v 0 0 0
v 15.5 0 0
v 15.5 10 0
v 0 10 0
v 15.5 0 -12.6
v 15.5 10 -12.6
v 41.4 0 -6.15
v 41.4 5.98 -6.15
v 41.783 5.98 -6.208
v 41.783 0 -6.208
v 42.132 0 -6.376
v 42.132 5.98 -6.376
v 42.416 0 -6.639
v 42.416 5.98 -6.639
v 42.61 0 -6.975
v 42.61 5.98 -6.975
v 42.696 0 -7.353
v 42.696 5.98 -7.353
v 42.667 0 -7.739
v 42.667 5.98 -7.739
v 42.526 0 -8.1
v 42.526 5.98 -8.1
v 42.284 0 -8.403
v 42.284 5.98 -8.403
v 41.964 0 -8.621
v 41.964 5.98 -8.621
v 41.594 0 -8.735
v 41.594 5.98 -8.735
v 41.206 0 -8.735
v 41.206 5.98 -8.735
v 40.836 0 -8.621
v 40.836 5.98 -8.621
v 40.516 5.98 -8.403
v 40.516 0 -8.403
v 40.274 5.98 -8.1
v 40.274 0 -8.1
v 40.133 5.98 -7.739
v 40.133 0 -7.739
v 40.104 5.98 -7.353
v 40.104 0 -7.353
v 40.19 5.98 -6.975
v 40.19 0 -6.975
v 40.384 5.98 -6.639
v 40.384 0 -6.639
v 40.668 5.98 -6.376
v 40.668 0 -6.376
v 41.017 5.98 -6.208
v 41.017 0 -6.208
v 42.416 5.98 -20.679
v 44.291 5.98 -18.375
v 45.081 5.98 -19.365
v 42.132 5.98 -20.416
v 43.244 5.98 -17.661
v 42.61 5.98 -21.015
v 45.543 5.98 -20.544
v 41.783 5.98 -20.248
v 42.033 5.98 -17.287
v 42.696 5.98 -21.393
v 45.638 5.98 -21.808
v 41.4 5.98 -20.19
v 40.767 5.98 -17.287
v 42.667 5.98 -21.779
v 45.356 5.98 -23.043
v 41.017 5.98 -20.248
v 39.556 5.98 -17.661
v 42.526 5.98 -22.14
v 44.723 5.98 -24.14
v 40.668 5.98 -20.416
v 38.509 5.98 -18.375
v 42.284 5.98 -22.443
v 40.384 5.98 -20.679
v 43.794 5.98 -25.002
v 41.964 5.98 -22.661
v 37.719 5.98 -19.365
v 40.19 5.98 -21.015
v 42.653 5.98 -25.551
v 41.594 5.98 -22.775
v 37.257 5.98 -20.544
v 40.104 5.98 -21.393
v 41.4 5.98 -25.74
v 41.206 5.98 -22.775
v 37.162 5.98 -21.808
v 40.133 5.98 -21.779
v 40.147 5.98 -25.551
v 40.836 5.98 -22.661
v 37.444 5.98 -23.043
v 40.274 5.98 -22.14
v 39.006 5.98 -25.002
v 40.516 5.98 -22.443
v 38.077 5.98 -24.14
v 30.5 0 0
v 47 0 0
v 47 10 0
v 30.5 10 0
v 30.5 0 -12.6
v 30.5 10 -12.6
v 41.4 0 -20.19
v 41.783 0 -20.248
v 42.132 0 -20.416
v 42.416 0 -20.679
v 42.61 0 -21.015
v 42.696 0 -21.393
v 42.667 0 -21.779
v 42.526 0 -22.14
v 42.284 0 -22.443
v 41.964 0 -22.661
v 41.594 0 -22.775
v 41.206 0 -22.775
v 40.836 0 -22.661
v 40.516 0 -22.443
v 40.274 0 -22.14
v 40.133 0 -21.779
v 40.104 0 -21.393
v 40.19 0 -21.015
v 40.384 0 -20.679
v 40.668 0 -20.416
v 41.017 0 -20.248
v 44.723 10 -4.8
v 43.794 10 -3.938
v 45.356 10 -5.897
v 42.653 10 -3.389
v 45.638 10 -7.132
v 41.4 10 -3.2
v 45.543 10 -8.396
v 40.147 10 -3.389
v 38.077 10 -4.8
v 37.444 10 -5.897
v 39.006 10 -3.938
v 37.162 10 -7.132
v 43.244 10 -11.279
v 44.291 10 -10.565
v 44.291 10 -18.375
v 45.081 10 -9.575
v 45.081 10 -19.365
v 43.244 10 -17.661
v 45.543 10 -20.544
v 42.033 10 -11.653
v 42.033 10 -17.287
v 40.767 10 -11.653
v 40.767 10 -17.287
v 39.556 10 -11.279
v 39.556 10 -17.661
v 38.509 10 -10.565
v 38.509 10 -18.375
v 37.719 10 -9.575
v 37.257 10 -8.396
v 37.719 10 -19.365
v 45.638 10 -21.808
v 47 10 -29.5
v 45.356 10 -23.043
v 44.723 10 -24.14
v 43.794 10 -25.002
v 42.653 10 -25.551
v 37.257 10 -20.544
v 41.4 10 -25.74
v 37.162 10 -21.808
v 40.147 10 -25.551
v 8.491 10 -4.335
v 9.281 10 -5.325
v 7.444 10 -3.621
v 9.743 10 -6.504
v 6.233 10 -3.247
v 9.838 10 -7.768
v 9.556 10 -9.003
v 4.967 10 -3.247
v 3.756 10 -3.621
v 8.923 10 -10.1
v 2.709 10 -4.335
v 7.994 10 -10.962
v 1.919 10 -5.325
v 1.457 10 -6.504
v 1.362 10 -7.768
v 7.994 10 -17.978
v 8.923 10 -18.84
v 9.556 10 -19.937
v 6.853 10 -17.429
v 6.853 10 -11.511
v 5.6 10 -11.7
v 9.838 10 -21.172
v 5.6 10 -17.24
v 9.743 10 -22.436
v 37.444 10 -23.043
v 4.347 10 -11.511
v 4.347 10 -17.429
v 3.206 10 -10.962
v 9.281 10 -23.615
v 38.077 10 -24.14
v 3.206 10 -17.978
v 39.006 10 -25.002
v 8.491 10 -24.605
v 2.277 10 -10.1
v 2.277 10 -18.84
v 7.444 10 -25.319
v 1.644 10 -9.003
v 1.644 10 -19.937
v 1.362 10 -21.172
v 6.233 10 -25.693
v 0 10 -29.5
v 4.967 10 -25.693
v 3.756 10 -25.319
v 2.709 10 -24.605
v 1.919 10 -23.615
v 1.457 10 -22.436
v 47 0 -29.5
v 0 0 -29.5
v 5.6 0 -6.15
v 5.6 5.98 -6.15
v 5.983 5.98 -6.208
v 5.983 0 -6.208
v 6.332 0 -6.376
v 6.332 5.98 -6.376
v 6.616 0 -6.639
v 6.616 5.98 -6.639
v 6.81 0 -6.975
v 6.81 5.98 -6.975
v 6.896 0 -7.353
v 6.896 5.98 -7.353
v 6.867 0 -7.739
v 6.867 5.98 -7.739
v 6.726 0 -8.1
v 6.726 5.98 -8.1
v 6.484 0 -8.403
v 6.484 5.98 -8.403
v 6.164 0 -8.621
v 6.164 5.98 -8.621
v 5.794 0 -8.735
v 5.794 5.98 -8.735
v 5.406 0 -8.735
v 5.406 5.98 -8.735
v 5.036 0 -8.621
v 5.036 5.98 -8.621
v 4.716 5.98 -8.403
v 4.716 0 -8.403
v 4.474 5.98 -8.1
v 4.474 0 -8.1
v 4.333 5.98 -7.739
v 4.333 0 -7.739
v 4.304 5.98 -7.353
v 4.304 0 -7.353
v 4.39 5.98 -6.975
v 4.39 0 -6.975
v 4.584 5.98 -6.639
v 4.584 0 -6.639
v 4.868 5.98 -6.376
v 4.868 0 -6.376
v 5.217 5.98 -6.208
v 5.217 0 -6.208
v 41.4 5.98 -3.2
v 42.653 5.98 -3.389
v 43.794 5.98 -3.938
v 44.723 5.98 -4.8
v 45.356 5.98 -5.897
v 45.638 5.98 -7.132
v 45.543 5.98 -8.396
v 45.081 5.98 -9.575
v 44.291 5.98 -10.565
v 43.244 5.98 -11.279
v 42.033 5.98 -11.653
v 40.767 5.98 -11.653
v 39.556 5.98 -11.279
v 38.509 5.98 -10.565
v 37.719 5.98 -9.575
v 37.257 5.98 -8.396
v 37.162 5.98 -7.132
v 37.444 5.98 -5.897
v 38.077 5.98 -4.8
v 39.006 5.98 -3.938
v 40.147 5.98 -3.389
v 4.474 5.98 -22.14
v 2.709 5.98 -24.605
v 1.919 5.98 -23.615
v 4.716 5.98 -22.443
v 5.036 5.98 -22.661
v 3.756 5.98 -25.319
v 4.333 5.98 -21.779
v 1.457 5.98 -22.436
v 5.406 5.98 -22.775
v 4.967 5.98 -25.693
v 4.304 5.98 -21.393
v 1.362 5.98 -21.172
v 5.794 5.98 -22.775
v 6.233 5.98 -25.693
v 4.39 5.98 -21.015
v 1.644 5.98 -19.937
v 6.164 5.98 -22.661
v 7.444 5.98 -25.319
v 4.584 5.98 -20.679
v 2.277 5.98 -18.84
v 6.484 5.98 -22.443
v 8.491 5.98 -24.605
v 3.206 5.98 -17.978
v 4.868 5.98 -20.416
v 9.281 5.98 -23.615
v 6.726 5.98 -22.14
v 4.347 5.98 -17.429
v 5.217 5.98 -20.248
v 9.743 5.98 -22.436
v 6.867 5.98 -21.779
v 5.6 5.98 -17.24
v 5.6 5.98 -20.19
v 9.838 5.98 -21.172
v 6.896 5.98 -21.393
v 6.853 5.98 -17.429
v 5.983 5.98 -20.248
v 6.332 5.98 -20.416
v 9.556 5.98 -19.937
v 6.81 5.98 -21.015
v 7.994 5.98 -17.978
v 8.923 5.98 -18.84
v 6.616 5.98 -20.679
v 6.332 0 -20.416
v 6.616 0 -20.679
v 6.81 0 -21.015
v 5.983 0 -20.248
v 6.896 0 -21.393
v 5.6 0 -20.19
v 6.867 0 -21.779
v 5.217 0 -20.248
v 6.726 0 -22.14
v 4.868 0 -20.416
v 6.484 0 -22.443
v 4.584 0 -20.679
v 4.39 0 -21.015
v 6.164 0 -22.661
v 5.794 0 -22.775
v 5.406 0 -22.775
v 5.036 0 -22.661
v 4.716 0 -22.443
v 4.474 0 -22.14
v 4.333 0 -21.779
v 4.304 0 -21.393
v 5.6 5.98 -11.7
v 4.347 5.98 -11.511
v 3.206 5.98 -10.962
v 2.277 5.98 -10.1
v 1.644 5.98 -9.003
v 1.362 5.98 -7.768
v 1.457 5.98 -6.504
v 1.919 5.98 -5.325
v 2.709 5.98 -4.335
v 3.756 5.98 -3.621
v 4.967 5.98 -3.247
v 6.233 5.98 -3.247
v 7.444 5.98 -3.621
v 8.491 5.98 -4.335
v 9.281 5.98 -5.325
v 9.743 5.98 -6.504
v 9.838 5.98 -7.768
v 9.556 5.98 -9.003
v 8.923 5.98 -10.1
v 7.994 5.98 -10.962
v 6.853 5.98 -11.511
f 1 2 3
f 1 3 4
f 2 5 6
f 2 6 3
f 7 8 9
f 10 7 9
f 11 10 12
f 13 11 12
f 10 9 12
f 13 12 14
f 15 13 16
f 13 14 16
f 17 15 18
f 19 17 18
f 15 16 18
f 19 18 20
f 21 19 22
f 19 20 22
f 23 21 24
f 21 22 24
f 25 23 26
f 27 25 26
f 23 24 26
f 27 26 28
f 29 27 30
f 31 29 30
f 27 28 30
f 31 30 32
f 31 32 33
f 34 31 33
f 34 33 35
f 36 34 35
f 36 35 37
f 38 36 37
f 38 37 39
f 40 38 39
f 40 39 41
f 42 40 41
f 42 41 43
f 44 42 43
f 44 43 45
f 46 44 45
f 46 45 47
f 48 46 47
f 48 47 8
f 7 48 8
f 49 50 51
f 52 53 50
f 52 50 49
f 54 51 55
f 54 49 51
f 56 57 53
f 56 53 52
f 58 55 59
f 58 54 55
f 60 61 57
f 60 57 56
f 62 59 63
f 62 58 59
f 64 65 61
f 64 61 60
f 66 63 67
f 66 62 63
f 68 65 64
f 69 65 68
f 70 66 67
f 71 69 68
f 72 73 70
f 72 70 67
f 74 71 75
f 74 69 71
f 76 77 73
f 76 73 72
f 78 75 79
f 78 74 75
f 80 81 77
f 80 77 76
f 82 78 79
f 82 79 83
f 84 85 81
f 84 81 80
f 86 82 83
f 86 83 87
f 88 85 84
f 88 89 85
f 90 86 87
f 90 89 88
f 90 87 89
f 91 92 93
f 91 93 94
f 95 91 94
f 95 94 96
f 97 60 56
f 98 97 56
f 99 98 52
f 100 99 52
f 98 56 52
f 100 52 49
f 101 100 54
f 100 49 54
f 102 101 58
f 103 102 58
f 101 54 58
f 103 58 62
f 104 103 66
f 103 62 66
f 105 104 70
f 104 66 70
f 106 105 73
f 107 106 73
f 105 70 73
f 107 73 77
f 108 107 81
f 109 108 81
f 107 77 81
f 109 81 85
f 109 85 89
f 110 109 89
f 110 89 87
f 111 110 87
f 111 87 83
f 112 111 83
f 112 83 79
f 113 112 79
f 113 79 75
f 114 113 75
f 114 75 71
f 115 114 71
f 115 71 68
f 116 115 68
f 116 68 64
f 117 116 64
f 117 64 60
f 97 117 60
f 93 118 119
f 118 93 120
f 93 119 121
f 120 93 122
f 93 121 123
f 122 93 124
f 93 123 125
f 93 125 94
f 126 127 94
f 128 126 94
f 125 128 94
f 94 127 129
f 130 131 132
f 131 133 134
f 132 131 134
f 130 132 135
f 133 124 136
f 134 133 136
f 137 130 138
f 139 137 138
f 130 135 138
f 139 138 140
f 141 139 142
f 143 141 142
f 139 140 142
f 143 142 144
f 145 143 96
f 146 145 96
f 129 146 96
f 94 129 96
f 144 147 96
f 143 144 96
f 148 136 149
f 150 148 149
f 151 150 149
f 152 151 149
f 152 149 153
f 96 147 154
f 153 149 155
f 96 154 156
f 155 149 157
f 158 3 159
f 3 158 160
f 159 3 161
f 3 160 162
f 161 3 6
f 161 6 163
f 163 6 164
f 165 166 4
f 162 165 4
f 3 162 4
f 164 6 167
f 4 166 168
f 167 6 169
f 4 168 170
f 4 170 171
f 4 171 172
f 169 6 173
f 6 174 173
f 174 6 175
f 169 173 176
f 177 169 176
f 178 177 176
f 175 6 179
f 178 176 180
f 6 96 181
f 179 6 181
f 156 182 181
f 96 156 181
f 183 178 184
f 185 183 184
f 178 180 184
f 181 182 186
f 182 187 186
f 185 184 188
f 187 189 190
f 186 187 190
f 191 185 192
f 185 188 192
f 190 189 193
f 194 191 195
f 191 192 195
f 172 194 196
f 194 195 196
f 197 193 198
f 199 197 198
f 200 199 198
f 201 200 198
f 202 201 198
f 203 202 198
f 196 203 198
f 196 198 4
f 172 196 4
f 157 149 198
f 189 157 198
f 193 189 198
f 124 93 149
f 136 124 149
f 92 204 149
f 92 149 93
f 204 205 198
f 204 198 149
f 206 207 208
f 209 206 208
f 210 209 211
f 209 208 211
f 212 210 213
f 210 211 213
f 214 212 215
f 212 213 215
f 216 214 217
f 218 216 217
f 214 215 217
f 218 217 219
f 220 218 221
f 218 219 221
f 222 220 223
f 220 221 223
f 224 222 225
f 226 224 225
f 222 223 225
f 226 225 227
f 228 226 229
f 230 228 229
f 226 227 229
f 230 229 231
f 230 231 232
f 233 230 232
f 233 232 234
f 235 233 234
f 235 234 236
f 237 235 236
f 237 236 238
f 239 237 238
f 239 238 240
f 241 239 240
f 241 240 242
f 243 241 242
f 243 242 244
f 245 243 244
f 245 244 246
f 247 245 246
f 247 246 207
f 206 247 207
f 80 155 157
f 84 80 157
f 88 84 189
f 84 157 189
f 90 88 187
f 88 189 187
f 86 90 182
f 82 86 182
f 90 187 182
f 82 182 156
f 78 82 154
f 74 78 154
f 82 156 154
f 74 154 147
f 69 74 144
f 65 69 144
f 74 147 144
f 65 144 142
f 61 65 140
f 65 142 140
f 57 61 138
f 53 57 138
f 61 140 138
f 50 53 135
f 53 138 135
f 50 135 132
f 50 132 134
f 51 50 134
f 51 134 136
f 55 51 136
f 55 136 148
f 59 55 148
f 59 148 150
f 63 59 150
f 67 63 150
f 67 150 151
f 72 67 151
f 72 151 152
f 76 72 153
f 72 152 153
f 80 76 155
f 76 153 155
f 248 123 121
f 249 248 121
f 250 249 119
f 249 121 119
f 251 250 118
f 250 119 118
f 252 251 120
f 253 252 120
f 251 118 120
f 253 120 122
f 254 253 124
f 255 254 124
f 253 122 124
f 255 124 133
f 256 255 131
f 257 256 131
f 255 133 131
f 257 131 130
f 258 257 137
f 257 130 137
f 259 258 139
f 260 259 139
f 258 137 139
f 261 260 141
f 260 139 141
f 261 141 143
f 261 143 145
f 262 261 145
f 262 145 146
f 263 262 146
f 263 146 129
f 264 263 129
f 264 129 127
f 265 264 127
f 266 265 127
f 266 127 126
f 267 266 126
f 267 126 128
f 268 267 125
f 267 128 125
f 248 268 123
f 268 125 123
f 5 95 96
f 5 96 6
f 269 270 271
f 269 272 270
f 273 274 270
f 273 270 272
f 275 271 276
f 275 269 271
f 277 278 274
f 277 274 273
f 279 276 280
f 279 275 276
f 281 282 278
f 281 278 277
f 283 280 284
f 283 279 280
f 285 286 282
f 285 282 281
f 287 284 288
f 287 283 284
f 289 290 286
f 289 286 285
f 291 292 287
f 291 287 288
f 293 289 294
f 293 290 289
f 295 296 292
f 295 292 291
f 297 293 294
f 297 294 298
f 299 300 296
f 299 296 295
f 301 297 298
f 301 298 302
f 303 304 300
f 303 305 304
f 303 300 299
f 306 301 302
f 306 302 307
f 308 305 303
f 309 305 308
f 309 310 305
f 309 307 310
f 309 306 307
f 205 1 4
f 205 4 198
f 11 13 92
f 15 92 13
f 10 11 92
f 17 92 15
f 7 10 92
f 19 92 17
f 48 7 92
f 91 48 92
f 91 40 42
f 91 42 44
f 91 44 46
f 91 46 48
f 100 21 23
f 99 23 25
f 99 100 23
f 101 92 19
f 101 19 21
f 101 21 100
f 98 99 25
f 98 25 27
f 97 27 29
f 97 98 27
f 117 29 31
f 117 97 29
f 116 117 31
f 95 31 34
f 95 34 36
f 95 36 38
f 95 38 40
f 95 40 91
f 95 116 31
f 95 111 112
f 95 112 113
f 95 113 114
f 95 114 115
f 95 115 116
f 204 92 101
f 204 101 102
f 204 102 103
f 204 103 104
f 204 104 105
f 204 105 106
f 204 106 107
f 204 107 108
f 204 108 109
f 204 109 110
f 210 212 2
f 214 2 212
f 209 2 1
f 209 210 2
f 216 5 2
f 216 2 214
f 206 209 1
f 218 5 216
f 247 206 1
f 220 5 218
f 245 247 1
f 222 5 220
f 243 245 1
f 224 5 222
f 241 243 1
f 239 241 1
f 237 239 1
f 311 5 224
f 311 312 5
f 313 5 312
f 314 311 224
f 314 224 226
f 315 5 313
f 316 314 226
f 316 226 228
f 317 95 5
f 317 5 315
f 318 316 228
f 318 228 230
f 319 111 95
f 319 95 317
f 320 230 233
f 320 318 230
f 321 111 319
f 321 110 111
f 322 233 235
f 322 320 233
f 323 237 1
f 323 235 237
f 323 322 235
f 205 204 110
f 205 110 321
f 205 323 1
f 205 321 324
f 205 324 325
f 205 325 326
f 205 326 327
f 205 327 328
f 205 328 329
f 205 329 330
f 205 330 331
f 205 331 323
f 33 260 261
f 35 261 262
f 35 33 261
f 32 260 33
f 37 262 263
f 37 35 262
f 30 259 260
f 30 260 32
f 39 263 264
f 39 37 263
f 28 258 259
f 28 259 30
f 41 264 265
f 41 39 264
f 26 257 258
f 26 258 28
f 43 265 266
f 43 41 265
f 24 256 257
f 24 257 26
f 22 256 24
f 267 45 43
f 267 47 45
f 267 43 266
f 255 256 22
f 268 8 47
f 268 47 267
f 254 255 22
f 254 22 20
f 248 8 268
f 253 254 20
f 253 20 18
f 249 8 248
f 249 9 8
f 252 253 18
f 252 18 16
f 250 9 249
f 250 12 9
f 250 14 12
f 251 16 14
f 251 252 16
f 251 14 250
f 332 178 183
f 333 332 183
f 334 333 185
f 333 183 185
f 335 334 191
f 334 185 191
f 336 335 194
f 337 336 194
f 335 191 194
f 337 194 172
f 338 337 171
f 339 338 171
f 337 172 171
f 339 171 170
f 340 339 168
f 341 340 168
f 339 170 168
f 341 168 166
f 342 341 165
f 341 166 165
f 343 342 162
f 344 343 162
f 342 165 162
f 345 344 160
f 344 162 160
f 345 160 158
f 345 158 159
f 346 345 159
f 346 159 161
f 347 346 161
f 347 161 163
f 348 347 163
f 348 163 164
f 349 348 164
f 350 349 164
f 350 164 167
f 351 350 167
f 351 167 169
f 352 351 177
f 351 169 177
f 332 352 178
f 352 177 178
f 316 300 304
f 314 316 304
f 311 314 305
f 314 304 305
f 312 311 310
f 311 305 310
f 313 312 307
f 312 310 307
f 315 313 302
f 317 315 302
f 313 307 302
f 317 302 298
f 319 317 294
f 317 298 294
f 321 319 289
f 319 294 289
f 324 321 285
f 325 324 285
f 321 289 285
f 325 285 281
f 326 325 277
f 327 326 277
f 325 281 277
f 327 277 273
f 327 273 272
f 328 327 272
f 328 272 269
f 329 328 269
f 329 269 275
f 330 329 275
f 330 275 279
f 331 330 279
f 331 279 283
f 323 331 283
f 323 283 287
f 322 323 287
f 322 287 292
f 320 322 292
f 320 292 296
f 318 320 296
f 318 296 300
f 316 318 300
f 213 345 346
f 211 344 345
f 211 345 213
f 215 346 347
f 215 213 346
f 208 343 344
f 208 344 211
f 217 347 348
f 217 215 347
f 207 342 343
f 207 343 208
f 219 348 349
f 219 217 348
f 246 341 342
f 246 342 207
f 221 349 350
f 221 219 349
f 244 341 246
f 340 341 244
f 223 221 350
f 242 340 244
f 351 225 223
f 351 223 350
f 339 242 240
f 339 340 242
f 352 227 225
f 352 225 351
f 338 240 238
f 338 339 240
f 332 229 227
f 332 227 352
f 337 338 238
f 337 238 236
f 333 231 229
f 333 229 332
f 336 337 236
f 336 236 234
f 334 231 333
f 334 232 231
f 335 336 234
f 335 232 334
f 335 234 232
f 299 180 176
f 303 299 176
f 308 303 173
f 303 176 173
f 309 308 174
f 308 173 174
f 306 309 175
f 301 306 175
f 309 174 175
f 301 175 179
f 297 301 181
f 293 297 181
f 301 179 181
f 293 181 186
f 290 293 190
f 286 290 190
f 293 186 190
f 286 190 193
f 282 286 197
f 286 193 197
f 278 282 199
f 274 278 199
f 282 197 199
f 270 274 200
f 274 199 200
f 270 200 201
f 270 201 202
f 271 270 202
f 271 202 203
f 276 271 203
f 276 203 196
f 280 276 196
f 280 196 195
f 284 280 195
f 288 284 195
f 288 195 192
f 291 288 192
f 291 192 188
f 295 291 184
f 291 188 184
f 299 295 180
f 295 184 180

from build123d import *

# Parameters (mm, degrees)
BOSS_EXTRUDE2_DEPTH = 10
SKETCH2_R           = 4.25
CUT_EXTRUDE1_DEPTH  = 4.02
SKETCH3_R           = 1.3
CUT_EXTRUDE2_DEPTH  = 56.812278219


with BuildPart() as part:
    # Sketch1 → Boss-Extrude2 (new body)
    with BuildSketch(Plane(origin=(0, 0, 0), x_dir=(1, 0, 0), z_dir=(0, 1, 0))):
        Polygon((0, 0), (0, 29.5), (47, 29.5), (47, 0), (30.5, 0), (30.5, 12.6), (15.5, 12.6), (15.5, 0), align=None)
    extrude(amount=BOSS_EXTRUDE2_DEPTH)

    # Sketch2 → Cut-Extrude1 (cut)
    with BuildSketch(Plane(origin=(0, 10, 0), x_dir=(1, 0, 0), z_dir=(0, 1, 0))):
        with Locations(Location((41.4, 7.45, 0), (0, 0, 270))):
            Circle(SKETCH2_R)
        with Locations(Location((5.6, 7.45, 0), (0, 0, 90))):
            Circle(SKETCH2_R)
        with Locations(Location((5.6, 21.49, 0), (0, 0, 270))):
            Circle(SKETCH2_R)
        with Locations(Location((41.4, 21.49, 0), (0, 0, 90))):
            Circle(SKETCH2_R)
    extrude(amount=-CUT_EXTRUDE1_DEPTH, mode=Mode.SUBTRACT)

    # Sketch3 → Cut-Extrude2 (cut, through all)
    with BuildSketch(Plane(origin=(0, 5.98, 0), x_dir=(1, 0, 0), z_dir=(0, 1, 0))):
        with Locations(Location((5.6, 7.45, 0), (0, 0, 270))):
            Circle(SKETCH3_R)
        with Locations(Location((41.4, 7.45, 0), (0, 0, 270))):
            Circle(SKETCH3_R)
        with Locations(Location((5.6, 21.49, 0), (0, 0, 270))):
            Circle(SKETCH3_R)
        with Locations(Location((41.4, 21.49, 0), (0, 0, 270))):
            Circle(SKETCH3_R)
    extrude(amount=-CUT_EXTRUDE2_DEPTH, mode=Mode.SUBTRACT)


solid = part.part
